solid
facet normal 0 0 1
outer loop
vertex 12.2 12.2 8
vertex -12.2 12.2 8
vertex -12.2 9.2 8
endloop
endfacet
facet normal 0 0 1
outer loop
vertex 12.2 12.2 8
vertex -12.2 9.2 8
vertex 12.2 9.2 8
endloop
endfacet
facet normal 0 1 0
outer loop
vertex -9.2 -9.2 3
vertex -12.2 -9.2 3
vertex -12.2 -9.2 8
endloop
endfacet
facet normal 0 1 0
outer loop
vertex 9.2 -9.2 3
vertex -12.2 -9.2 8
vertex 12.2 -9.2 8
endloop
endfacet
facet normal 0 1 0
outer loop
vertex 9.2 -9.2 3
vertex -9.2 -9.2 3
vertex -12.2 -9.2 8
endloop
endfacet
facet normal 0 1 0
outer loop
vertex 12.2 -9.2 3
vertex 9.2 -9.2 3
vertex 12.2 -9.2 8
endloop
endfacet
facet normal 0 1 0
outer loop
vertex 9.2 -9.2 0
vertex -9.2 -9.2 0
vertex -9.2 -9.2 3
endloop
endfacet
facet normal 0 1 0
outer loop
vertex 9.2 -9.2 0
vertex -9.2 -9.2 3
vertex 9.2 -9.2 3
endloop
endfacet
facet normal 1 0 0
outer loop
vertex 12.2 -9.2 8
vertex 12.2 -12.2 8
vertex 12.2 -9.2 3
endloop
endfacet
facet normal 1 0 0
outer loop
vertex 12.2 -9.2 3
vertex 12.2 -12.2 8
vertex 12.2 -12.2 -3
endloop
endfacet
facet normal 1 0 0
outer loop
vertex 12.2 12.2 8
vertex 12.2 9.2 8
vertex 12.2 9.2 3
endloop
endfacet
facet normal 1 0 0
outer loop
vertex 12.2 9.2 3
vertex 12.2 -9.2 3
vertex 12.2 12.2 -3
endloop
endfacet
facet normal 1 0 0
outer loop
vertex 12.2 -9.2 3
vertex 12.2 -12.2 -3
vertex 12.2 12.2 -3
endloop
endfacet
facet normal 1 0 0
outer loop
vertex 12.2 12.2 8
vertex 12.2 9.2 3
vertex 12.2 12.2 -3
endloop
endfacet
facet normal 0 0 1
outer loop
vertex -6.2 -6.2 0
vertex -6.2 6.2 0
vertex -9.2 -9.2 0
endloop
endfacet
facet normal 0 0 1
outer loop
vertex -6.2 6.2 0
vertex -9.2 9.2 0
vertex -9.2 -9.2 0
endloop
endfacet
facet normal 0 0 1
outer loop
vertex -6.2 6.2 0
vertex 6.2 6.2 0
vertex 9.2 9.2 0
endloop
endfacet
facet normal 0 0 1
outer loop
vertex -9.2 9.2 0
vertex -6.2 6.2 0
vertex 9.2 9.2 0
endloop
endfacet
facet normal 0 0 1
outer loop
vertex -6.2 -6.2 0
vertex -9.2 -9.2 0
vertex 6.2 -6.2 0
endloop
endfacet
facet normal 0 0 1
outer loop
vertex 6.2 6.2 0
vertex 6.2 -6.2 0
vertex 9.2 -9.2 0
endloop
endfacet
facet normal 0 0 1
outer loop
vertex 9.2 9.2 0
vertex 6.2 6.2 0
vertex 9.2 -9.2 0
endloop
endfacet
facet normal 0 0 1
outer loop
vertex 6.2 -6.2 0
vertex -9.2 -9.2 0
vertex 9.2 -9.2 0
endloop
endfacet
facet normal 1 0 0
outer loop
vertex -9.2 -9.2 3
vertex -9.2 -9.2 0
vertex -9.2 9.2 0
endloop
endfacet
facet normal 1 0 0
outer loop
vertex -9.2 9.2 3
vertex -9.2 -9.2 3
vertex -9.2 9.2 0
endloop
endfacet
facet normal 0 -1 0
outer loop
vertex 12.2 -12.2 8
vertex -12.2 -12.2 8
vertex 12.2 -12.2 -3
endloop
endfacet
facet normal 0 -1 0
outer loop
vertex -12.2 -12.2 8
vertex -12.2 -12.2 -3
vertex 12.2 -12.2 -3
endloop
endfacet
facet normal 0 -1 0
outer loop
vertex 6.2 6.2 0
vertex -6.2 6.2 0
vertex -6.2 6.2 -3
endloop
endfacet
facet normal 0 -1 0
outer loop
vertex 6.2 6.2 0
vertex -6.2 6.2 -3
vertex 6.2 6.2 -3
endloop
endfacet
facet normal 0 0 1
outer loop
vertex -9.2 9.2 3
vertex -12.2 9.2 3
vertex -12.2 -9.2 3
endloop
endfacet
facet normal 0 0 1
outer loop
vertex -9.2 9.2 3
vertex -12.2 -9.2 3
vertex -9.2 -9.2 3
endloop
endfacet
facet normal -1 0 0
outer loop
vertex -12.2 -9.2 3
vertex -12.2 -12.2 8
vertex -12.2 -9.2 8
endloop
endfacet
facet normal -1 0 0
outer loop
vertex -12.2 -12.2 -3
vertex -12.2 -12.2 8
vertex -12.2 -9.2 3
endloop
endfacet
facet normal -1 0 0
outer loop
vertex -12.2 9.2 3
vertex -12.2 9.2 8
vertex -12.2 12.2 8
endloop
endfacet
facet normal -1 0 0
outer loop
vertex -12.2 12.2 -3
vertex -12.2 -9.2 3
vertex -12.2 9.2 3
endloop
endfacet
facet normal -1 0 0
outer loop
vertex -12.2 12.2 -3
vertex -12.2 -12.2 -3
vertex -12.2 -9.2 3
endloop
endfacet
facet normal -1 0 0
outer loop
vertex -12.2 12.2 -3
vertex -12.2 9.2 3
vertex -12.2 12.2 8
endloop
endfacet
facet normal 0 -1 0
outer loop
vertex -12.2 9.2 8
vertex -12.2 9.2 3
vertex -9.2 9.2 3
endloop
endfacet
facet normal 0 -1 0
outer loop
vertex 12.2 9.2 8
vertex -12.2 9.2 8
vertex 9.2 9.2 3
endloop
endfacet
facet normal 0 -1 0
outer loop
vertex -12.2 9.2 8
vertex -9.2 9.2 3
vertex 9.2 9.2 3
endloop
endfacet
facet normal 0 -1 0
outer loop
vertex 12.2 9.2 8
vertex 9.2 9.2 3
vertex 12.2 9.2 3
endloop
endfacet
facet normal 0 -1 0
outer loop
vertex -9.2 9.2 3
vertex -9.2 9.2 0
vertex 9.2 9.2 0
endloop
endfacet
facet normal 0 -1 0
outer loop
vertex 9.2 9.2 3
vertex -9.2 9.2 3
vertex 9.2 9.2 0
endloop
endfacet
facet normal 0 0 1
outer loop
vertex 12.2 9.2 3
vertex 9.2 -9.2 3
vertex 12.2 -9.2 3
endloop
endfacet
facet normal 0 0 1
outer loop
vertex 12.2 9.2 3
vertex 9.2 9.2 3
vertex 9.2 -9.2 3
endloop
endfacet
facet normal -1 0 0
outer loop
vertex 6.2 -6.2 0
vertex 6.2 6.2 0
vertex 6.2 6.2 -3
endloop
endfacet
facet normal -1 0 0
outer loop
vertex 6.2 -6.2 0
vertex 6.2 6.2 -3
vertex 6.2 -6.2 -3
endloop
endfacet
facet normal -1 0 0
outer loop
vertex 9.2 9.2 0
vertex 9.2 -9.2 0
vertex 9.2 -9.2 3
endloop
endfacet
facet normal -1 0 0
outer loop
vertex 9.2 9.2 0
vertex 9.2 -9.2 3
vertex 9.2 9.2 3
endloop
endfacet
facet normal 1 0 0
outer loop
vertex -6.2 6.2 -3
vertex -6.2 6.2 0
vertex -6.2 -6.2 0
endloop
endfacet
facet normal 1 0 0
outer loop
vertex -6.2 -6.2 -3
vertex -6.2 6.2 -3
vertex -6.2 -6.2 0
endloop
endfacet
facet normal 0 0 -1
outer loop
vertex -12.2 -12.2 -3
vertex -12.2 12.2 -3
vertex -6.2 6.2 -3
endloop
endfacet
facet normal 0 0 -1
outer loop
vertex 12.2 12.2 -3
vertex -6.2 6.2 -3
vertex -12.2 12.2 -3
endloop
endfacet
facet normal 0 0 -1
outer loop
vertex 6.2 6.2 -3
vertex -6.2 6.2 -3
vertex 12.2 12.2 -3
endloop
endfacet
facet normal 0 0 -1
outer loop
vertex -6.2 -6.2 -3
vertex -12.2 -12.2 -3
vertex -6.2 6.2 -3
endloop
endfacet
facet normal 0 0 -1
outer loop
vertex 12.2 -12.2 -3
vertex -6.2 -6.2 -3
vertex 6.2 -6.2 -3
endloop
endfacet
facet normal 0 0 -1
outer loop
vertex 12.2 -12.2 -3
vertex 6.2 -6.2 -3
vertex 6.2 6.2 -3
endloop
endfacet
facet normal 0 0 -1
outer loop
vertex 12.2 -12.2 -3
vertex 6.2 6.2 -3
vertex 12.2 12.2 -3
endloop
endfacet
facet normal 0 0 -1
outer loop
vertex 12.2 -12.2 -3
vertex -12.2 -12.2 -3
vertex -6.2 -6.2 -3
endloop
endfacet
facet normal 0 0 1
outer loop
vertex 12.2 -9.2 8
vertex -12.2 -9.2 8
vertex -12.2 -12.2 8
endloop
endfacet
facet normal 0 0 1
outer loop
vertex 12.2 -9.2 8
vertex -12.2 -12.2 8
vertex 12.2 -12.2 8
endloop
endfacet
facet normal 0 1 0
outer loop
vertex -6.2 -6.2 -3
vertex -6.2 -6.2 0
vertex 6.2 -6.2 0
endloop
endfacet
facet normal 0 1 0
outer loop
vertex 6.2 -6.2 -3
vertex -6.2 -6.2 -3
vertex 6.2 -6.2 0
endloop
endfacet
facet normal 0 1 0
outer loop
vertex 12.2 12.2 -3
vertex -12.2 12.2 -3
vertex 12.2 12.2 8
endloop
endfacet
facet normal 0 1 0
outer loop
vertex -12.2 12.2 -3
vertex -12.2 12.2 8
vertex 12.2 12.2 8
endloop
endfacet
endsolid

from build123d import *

# Parameters (mm, degrees)
F0_W     = 24.4
F0_H     = 24.4
F0_W_2   = 18.4
F0_H_2   = 18.4
F1_DEPTH = 3
F2_W     = 24.4
F2_H     = 24.4
F2_W_2   = 12.4
F2_H_2   = 12.4
F3_DEPTH = 3
F4_W     = 24.4
F4_H     = 3
F5_DEPTH = 5


with BuildPart() as f1:
    # F0 (on Top) → F1 (new body)
    with BuildSketch(Plane.XY):
        Rectangle(F0_W, F0_H)
        Rectangle(F0_W_2, F0_H_2, mode=Mode.SUBTRACT)
    extrude(amount=F1_DEPTH)

    # F2 (on face) → F3 (join)
    with BuildSketch(Plane(origin=(0, 0, 0), x_dir=(1, 0, 0), z_dir=(0, 0, -1))):
        Rectangle(F2_W, F2_H)
        Rectangle(F2_W_2, F2_H_2, mode=Mode.SUBTRACT)
    extrude(amount=F3_DEPTH)

    # F4 (on face) → F5 (join)
    with BuildSketch(Plane.XY.offset(3)):
        with Locations((0, -10.7)):
            Rectangle(F4_W, F4_H)
        with Locations((0, 10.7)):
            Rectangle(F4_W, F4_H)
    extrude(amount=F5_DEPTH)


solid = f1.part
